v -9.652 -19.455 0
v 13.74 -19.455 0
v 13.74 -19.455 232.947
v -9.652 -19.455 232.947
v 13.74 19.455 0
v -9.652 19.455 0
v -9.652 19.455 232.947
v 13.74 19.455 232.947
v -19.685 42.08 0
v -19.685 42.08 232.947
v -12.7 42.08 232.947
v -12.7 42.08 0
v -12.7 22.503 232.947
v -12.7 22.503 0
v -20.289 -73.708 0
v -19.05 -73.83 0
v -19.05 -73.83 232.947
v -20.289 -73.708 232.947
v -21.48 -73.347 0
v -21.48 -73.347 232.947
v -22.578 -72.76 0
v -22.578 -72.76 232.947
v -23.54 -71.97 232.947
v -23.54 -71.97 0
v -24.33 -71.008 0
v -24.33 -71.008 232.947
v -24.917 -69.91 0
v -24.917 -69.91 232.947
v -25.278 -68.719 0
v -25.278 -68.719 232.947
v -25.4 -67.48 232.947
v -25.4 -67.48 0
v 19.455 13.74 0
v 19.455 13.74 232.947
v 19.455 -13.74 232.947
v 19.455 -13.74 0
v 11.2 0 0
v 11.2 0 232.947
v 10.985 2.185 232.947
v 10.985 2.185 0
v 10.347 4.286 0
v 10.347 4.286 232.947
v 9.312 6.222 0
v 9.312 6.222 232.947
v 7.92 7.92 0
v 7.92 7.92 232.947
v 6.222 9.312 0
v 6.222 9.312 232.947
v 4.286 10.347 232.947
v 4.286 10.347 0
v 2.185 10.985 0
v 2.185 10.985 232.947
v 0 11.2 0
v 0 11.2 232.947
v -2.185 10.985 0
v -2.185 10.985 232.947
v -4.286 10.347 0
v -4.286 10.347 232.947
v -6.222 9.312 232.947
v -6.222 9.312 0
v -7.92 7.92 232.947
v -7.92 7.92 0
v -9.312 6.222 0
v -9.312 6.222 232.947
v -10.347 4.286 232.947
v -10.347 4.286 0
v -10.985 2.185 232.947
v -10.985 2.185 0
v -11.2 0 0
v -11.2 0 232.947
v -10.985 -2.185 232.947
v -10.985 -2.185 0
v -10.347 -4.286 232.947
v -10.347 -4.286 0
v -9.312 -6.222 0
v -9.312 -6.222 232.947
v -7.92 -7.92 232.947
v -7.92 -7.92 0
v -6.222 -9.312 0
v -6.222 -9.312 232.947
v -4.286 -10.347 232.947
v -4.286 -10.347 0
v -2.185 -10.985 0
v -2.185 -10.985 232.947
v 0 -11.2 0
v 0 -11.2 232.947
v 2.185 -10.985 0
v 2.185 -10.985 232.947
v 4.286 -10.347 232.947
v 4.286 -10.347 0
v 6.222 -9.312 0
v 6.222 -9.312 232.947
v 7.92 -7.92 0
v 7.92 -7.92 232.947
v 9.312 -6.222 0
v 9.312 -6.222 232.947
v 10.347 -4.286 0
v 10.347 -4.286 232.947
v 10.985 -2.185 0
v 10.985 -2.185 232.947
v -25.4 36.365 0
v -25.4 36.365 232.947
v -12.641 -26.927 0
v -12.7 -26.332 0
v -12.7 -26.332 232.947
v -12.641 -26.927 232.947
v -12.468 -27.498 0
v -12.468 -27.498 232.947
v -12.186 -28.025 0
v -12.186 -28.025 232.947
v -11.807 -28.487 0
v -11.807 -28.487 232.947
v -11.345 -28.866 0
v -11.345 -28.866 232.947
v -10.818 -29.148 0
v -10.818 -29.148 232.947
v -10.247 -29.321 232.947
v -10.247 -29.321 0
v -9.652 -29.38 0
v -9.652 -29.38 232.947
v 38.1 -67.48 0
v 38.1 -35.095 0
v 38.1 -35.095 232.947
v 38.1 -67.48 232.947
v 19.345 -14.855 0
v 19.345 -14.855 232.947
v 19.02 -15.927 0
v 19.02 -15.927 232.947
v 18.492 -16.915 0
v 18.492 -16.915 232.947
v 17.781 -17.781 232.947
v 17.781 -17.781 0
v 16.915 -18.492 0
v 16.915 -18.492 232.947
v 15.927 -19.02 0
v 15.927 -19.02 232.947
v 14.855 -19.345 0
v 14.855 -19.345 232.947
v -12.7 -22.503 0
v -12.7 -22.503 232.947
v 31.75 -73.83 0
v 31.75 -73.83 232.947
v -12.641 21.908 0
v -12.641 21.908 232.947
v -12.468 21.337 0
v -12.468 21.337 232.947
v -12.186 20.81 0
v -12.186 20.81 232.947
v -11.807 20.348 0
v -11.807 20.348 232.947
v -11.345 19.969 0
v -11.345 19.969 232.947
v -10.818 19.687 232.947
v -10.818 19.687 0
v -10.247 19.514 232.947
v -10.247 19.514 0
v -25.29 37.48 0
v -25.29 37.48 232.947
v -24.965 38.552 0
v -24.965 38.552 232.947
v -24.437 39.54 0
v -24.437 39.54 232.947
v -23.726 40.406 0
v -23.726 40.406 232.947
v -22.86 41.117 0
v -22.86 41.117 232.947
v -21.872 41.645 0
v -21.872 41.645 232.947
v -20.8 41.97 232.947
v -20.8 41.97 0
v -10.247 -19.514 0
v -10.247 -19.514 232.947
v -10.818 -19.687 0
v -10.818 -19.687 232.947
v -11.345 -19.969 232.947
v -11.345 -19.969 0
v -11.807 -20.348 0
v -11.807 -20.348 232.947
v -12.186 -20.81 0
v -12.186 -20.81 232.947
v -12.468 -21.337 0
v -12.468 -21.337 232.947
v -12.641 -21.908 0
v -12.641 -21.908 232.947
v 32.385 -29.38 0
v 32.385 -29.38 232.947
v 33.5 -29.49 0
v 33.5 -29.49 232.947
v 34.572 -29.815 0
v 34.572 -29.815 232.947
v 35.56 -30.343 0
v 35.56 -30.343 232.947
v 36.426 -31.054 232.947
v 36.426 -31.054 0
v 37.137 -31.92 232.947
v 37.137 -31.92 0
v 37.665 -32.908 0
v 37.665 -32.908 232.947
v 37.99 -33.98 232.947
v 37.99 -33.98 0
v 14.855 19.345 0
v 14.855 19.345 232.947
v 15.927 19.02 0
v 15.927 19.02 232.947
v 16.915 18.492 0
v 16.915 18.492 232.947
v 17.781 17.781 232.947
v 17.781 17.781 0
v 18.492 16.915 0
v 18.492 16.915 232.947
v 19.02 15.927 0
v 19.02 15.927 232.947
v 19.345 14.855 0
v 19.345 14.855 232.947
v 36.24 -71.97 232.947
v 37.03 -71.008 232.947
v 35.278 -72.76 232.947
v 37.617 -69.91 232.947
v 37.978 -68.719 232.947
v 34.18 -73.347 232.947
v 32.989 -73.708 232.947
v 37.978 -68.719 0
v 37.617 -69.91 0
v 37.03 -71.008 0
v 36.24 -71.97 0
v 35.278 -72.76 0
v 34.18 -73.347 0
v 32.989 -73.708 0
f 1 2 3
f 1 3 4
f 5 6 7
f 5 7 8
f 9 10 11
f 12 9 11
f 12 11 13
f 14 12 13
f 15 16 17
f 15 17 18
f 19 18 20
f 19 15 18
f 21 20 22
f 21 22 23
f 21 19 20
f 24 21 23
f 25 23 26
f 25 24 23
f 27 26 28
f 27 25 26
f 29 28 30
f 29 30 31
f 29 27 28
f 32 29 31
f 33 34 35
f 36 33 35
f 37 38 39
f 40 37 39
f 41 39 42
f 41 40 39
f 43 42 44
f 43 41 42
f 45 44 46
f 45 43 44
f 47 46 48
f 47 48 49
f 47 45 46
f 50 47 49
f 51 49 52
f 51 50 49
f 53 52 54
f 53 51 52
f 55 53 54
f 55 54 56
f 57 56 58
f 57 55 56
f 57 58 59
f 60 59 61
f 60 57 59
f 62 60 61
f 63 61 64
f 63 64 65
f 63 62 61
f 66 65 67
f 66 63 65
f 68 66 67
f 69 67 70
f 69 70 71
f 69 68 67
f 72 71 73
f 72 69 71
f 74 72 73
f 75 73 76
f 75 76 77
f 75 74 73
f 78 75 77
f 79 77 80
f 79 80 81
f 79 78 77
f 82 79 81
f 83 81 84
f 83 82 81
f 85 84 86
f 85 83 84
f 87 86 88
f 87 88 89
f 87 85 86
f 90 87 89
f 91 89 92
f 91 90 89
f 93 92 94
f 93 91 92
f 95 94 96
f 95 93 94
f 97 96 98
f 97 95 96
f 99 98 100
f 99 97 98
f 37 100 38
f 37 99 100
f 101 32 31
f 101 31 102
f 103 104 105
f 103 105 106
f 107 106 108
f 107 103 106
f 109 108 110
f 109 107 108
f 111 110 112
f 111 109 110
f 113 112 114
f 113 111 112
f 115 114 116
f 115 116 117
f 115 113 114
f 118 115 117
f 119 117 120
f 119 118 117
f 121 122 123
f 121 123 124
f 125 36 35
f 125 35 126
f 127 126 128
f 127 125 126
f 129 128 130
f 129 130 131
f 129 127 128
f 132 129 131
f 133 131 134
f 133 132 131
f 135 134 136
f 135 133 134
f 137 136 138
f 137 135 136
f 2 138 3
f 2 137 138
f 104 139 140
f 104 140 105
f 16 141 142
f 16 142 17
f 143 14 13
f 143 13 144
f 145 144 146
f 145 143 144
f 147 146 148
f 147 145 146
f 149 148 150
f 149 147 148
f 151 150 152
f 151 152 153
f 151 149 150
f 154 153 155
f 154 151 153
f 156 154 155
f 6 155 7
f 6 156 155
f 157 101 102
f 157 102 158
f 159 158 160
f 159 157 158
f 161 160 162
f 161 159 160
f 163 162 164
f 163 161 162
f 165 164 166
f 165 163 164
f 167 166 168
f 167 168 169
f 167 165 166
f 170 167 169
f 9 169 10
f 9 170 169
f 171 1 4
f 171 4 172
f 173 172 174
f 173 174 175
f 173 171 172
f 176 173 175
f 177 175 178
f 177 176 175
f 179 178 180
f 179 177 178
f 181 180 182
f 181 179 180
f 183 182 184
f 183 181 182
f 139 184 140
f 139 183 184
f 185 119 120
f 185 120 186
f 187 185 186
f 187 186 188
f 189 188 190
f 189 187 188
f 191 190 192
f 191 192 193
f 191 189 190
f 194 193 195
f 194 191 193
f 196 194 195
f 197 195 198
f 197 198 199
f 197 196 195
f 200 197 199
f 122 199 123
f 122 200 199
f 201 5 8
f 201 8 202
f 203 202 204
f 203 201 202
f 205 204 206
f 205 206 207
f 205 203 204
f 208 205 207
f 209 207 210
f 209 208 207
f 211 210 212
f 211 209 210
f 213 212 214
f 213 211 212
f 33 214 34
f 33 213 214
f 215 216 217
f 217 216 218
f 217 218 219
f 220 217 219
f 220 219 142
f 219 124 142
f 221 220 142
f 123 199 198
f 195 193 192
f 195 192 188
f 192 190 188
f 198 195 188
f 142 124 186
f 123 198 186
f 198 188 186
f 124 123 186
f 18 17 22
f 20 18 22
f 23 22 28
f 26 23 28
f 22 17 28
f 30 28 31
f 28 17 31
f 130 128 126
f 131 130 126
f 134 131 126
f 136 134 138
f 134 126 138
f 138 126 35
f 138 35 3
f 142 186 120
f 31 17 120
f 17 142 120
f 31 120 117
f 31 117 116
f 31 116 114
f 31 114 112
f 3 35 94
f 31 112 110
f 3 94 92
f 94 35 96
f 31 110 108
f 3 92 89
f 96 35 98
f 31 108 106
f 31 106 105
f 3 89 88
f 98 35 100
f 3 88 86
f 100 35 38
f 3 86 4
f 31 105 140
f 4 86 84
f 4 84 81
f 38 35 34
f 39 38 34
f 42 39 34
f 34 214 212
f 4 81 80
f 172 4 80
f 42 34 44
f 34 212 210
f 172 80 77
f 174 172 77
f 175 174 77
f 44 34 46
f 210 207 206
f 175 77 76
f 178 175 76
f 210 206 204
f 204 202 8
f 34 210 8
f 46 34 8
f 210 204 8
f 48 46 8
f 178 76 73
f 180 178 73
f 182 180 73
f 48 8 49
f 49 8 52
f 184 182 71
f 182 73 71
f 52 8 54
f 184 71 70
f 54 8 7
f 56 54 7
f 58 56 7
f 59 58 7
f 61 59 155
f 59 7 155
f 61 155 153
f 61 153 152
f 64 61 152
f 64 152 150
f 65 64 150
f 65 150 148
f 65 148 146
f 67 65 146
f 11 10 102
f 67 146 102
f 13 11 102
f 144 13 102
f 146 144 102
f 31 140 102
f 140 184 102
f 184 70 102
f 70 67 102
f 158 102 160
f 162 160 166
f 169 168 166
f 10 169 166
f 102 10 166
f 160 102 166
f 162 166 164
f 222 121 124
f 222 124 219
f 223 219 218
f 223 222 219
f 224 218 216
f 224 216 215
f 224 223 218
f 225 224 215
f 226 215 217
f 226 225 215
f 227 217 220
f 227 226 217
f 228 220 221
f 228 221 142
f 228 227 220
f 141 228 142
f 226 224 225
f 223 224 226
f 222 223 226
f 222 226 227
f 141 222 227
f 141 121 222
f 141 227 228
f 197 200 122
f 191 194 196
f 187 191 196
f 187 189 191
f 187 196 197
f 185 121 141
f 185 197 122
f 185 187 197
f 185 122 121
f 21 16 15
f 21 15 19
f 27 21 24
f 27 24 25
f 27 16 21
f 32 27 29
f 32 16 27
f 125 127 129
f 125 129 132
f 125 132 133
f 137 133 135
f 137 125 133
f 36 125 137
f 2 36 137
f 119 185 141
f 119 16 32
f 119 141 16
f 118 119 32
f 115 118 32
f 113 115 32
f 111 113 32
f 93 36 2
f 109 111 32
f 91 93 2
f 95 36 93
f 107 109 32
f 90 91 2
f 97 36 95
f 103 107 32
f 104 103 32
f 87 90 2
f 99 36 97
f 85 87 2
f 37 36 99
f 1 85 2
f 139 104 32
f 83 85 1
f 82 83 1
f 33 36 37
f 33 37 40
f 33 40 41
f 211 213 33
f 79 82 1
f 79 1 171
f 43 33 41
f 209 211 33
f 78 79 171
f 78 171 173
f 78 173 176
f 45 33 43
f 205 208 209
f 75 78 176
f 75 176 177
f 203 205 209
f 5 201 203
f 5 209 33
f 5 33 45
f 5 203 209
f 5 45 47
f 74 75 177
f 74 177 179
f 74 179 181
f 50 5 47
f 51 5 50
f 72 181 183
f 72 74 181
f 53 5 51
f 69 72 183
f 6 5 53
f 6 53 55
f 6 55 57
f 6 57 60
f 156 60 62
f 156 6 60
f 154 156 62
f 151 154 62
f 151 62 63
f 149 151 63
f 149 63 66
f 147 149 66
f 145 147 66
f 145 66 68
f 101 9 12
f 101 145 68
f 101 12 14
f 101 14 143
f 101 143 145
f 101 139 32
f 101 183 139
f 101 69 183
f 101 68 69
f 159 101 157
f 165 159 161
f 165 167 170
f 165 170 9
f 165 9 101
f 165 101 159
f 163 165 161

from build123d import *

# Parameters (mm, degrees)
SKETCH1_R           = 11.2
BOSS_EXTRUDE1_DEPTH = 232.947291788
CUT_EXTRUDE1_DEPTH  = 236.982


with BuildPart() as part:
    # Sketch1 → Boss-Extrude1 (new body)
    with BuildSketch(Plane.XY):
        with BuildLine():
            Line((-25.4, -67.479999962), (-25.4, 36.365))
            ThreePointArc((-25.4, 36.365), (-23.726115254, 40.406115254), (-19.685, 42.08))
            Line((-19.685, 42.08), (32.385, 42.08))
            ThreePointArc((32.385, 42.08), (36.426115254, 40.406115254), (38.1, 36.365))
            Line((38.1, 36.365), (38.1, 35.095))
            ThreePointArc((38.1, 35.095), (36.426115254, 31.053884746), (32.385, 29.38))
            Line((32.385, 29.38), (-9.652, 29.38))
            ThreePointArc((-9.652, 29.38), (-11.807261469, 28.487261469), (-12.7, 26.332))
            Line((-12.7, 26.332), (-12.7, 22.503))
            ThreePointArc((-12.7, 22.503), (-11.807261469, 20.347738531), (-9.652, 19.455))
            Line((-9.652, 19.455), (0, 19.455))
            Line((0, 19.455), (13.74, 19.455))
            ThreePointArc((13.74, 19.455), (17.781115254, 17.781115254), (19.455, 13.74))
            Line((19.455, 13.74), (19.455, 0))
            Line((19.455, 0), (19.455, -13.74))
            ThreePointArc((19.455, -13.74), (17.781115254, -17.781115254), (13.74, -19.455))
            Line((13.74, -19.455), (0, -19.455))
            Line((0, -19.455), (-9.652, -19.455))
            ThreePointArc((-9.652, -19.455), (-11.807261469, -20.347738531), (-12.7, -22.503))
            Line((-12.7, -22.503), (-12.7, -26.331999962))
            ThreePointArc((-12.7, -26.331999962), (-11.807261469, -28.487261431), (-9.652, -29.379999962))
            Line((-9.652, -29.379999962), (32.385, -29.379999962))
            ThreePointArc((32.385, -29.379999962), (36.426115254, -31.053884708), (38.1, -35.094999962))
            Line((38.1, -35.094999962), (38.1, -67.479999962))
            ThreePointArc((38.1, -67.479999962), (36.240128061, -71.970128023), (31.75, -73.829999962))
            Line((31.75, -73.829999962), (-19.05, -73.829999962))
            ThreePointArc((-19.05, -73.829999962), (-23.540128061, -71.970128023), (-25.4, -67.479999962))
        make_face()
        Circle(SKETCH1_R, mode=Mode.SUBTRACT)
    extrude(amount=BOSS_EXTRUDE1_DEPTH)

    # Sketch2 → Cut-Extrude1 (cut)
    with BuildSketch(Plane.XY.offset(232.947291788)):
        Polygon((19.455, -13.74), (38.1, -13.74), (38.1, 42.08), (19.455, 42.08), (-12.7, 42.08), (-12.7, 22.503), (19.455, 22.503), align=None)
    extrude(amount=-CUT_EXTRUDE1_DEPTH, mode=Mode.SUBTRACT)


solid = part.part
